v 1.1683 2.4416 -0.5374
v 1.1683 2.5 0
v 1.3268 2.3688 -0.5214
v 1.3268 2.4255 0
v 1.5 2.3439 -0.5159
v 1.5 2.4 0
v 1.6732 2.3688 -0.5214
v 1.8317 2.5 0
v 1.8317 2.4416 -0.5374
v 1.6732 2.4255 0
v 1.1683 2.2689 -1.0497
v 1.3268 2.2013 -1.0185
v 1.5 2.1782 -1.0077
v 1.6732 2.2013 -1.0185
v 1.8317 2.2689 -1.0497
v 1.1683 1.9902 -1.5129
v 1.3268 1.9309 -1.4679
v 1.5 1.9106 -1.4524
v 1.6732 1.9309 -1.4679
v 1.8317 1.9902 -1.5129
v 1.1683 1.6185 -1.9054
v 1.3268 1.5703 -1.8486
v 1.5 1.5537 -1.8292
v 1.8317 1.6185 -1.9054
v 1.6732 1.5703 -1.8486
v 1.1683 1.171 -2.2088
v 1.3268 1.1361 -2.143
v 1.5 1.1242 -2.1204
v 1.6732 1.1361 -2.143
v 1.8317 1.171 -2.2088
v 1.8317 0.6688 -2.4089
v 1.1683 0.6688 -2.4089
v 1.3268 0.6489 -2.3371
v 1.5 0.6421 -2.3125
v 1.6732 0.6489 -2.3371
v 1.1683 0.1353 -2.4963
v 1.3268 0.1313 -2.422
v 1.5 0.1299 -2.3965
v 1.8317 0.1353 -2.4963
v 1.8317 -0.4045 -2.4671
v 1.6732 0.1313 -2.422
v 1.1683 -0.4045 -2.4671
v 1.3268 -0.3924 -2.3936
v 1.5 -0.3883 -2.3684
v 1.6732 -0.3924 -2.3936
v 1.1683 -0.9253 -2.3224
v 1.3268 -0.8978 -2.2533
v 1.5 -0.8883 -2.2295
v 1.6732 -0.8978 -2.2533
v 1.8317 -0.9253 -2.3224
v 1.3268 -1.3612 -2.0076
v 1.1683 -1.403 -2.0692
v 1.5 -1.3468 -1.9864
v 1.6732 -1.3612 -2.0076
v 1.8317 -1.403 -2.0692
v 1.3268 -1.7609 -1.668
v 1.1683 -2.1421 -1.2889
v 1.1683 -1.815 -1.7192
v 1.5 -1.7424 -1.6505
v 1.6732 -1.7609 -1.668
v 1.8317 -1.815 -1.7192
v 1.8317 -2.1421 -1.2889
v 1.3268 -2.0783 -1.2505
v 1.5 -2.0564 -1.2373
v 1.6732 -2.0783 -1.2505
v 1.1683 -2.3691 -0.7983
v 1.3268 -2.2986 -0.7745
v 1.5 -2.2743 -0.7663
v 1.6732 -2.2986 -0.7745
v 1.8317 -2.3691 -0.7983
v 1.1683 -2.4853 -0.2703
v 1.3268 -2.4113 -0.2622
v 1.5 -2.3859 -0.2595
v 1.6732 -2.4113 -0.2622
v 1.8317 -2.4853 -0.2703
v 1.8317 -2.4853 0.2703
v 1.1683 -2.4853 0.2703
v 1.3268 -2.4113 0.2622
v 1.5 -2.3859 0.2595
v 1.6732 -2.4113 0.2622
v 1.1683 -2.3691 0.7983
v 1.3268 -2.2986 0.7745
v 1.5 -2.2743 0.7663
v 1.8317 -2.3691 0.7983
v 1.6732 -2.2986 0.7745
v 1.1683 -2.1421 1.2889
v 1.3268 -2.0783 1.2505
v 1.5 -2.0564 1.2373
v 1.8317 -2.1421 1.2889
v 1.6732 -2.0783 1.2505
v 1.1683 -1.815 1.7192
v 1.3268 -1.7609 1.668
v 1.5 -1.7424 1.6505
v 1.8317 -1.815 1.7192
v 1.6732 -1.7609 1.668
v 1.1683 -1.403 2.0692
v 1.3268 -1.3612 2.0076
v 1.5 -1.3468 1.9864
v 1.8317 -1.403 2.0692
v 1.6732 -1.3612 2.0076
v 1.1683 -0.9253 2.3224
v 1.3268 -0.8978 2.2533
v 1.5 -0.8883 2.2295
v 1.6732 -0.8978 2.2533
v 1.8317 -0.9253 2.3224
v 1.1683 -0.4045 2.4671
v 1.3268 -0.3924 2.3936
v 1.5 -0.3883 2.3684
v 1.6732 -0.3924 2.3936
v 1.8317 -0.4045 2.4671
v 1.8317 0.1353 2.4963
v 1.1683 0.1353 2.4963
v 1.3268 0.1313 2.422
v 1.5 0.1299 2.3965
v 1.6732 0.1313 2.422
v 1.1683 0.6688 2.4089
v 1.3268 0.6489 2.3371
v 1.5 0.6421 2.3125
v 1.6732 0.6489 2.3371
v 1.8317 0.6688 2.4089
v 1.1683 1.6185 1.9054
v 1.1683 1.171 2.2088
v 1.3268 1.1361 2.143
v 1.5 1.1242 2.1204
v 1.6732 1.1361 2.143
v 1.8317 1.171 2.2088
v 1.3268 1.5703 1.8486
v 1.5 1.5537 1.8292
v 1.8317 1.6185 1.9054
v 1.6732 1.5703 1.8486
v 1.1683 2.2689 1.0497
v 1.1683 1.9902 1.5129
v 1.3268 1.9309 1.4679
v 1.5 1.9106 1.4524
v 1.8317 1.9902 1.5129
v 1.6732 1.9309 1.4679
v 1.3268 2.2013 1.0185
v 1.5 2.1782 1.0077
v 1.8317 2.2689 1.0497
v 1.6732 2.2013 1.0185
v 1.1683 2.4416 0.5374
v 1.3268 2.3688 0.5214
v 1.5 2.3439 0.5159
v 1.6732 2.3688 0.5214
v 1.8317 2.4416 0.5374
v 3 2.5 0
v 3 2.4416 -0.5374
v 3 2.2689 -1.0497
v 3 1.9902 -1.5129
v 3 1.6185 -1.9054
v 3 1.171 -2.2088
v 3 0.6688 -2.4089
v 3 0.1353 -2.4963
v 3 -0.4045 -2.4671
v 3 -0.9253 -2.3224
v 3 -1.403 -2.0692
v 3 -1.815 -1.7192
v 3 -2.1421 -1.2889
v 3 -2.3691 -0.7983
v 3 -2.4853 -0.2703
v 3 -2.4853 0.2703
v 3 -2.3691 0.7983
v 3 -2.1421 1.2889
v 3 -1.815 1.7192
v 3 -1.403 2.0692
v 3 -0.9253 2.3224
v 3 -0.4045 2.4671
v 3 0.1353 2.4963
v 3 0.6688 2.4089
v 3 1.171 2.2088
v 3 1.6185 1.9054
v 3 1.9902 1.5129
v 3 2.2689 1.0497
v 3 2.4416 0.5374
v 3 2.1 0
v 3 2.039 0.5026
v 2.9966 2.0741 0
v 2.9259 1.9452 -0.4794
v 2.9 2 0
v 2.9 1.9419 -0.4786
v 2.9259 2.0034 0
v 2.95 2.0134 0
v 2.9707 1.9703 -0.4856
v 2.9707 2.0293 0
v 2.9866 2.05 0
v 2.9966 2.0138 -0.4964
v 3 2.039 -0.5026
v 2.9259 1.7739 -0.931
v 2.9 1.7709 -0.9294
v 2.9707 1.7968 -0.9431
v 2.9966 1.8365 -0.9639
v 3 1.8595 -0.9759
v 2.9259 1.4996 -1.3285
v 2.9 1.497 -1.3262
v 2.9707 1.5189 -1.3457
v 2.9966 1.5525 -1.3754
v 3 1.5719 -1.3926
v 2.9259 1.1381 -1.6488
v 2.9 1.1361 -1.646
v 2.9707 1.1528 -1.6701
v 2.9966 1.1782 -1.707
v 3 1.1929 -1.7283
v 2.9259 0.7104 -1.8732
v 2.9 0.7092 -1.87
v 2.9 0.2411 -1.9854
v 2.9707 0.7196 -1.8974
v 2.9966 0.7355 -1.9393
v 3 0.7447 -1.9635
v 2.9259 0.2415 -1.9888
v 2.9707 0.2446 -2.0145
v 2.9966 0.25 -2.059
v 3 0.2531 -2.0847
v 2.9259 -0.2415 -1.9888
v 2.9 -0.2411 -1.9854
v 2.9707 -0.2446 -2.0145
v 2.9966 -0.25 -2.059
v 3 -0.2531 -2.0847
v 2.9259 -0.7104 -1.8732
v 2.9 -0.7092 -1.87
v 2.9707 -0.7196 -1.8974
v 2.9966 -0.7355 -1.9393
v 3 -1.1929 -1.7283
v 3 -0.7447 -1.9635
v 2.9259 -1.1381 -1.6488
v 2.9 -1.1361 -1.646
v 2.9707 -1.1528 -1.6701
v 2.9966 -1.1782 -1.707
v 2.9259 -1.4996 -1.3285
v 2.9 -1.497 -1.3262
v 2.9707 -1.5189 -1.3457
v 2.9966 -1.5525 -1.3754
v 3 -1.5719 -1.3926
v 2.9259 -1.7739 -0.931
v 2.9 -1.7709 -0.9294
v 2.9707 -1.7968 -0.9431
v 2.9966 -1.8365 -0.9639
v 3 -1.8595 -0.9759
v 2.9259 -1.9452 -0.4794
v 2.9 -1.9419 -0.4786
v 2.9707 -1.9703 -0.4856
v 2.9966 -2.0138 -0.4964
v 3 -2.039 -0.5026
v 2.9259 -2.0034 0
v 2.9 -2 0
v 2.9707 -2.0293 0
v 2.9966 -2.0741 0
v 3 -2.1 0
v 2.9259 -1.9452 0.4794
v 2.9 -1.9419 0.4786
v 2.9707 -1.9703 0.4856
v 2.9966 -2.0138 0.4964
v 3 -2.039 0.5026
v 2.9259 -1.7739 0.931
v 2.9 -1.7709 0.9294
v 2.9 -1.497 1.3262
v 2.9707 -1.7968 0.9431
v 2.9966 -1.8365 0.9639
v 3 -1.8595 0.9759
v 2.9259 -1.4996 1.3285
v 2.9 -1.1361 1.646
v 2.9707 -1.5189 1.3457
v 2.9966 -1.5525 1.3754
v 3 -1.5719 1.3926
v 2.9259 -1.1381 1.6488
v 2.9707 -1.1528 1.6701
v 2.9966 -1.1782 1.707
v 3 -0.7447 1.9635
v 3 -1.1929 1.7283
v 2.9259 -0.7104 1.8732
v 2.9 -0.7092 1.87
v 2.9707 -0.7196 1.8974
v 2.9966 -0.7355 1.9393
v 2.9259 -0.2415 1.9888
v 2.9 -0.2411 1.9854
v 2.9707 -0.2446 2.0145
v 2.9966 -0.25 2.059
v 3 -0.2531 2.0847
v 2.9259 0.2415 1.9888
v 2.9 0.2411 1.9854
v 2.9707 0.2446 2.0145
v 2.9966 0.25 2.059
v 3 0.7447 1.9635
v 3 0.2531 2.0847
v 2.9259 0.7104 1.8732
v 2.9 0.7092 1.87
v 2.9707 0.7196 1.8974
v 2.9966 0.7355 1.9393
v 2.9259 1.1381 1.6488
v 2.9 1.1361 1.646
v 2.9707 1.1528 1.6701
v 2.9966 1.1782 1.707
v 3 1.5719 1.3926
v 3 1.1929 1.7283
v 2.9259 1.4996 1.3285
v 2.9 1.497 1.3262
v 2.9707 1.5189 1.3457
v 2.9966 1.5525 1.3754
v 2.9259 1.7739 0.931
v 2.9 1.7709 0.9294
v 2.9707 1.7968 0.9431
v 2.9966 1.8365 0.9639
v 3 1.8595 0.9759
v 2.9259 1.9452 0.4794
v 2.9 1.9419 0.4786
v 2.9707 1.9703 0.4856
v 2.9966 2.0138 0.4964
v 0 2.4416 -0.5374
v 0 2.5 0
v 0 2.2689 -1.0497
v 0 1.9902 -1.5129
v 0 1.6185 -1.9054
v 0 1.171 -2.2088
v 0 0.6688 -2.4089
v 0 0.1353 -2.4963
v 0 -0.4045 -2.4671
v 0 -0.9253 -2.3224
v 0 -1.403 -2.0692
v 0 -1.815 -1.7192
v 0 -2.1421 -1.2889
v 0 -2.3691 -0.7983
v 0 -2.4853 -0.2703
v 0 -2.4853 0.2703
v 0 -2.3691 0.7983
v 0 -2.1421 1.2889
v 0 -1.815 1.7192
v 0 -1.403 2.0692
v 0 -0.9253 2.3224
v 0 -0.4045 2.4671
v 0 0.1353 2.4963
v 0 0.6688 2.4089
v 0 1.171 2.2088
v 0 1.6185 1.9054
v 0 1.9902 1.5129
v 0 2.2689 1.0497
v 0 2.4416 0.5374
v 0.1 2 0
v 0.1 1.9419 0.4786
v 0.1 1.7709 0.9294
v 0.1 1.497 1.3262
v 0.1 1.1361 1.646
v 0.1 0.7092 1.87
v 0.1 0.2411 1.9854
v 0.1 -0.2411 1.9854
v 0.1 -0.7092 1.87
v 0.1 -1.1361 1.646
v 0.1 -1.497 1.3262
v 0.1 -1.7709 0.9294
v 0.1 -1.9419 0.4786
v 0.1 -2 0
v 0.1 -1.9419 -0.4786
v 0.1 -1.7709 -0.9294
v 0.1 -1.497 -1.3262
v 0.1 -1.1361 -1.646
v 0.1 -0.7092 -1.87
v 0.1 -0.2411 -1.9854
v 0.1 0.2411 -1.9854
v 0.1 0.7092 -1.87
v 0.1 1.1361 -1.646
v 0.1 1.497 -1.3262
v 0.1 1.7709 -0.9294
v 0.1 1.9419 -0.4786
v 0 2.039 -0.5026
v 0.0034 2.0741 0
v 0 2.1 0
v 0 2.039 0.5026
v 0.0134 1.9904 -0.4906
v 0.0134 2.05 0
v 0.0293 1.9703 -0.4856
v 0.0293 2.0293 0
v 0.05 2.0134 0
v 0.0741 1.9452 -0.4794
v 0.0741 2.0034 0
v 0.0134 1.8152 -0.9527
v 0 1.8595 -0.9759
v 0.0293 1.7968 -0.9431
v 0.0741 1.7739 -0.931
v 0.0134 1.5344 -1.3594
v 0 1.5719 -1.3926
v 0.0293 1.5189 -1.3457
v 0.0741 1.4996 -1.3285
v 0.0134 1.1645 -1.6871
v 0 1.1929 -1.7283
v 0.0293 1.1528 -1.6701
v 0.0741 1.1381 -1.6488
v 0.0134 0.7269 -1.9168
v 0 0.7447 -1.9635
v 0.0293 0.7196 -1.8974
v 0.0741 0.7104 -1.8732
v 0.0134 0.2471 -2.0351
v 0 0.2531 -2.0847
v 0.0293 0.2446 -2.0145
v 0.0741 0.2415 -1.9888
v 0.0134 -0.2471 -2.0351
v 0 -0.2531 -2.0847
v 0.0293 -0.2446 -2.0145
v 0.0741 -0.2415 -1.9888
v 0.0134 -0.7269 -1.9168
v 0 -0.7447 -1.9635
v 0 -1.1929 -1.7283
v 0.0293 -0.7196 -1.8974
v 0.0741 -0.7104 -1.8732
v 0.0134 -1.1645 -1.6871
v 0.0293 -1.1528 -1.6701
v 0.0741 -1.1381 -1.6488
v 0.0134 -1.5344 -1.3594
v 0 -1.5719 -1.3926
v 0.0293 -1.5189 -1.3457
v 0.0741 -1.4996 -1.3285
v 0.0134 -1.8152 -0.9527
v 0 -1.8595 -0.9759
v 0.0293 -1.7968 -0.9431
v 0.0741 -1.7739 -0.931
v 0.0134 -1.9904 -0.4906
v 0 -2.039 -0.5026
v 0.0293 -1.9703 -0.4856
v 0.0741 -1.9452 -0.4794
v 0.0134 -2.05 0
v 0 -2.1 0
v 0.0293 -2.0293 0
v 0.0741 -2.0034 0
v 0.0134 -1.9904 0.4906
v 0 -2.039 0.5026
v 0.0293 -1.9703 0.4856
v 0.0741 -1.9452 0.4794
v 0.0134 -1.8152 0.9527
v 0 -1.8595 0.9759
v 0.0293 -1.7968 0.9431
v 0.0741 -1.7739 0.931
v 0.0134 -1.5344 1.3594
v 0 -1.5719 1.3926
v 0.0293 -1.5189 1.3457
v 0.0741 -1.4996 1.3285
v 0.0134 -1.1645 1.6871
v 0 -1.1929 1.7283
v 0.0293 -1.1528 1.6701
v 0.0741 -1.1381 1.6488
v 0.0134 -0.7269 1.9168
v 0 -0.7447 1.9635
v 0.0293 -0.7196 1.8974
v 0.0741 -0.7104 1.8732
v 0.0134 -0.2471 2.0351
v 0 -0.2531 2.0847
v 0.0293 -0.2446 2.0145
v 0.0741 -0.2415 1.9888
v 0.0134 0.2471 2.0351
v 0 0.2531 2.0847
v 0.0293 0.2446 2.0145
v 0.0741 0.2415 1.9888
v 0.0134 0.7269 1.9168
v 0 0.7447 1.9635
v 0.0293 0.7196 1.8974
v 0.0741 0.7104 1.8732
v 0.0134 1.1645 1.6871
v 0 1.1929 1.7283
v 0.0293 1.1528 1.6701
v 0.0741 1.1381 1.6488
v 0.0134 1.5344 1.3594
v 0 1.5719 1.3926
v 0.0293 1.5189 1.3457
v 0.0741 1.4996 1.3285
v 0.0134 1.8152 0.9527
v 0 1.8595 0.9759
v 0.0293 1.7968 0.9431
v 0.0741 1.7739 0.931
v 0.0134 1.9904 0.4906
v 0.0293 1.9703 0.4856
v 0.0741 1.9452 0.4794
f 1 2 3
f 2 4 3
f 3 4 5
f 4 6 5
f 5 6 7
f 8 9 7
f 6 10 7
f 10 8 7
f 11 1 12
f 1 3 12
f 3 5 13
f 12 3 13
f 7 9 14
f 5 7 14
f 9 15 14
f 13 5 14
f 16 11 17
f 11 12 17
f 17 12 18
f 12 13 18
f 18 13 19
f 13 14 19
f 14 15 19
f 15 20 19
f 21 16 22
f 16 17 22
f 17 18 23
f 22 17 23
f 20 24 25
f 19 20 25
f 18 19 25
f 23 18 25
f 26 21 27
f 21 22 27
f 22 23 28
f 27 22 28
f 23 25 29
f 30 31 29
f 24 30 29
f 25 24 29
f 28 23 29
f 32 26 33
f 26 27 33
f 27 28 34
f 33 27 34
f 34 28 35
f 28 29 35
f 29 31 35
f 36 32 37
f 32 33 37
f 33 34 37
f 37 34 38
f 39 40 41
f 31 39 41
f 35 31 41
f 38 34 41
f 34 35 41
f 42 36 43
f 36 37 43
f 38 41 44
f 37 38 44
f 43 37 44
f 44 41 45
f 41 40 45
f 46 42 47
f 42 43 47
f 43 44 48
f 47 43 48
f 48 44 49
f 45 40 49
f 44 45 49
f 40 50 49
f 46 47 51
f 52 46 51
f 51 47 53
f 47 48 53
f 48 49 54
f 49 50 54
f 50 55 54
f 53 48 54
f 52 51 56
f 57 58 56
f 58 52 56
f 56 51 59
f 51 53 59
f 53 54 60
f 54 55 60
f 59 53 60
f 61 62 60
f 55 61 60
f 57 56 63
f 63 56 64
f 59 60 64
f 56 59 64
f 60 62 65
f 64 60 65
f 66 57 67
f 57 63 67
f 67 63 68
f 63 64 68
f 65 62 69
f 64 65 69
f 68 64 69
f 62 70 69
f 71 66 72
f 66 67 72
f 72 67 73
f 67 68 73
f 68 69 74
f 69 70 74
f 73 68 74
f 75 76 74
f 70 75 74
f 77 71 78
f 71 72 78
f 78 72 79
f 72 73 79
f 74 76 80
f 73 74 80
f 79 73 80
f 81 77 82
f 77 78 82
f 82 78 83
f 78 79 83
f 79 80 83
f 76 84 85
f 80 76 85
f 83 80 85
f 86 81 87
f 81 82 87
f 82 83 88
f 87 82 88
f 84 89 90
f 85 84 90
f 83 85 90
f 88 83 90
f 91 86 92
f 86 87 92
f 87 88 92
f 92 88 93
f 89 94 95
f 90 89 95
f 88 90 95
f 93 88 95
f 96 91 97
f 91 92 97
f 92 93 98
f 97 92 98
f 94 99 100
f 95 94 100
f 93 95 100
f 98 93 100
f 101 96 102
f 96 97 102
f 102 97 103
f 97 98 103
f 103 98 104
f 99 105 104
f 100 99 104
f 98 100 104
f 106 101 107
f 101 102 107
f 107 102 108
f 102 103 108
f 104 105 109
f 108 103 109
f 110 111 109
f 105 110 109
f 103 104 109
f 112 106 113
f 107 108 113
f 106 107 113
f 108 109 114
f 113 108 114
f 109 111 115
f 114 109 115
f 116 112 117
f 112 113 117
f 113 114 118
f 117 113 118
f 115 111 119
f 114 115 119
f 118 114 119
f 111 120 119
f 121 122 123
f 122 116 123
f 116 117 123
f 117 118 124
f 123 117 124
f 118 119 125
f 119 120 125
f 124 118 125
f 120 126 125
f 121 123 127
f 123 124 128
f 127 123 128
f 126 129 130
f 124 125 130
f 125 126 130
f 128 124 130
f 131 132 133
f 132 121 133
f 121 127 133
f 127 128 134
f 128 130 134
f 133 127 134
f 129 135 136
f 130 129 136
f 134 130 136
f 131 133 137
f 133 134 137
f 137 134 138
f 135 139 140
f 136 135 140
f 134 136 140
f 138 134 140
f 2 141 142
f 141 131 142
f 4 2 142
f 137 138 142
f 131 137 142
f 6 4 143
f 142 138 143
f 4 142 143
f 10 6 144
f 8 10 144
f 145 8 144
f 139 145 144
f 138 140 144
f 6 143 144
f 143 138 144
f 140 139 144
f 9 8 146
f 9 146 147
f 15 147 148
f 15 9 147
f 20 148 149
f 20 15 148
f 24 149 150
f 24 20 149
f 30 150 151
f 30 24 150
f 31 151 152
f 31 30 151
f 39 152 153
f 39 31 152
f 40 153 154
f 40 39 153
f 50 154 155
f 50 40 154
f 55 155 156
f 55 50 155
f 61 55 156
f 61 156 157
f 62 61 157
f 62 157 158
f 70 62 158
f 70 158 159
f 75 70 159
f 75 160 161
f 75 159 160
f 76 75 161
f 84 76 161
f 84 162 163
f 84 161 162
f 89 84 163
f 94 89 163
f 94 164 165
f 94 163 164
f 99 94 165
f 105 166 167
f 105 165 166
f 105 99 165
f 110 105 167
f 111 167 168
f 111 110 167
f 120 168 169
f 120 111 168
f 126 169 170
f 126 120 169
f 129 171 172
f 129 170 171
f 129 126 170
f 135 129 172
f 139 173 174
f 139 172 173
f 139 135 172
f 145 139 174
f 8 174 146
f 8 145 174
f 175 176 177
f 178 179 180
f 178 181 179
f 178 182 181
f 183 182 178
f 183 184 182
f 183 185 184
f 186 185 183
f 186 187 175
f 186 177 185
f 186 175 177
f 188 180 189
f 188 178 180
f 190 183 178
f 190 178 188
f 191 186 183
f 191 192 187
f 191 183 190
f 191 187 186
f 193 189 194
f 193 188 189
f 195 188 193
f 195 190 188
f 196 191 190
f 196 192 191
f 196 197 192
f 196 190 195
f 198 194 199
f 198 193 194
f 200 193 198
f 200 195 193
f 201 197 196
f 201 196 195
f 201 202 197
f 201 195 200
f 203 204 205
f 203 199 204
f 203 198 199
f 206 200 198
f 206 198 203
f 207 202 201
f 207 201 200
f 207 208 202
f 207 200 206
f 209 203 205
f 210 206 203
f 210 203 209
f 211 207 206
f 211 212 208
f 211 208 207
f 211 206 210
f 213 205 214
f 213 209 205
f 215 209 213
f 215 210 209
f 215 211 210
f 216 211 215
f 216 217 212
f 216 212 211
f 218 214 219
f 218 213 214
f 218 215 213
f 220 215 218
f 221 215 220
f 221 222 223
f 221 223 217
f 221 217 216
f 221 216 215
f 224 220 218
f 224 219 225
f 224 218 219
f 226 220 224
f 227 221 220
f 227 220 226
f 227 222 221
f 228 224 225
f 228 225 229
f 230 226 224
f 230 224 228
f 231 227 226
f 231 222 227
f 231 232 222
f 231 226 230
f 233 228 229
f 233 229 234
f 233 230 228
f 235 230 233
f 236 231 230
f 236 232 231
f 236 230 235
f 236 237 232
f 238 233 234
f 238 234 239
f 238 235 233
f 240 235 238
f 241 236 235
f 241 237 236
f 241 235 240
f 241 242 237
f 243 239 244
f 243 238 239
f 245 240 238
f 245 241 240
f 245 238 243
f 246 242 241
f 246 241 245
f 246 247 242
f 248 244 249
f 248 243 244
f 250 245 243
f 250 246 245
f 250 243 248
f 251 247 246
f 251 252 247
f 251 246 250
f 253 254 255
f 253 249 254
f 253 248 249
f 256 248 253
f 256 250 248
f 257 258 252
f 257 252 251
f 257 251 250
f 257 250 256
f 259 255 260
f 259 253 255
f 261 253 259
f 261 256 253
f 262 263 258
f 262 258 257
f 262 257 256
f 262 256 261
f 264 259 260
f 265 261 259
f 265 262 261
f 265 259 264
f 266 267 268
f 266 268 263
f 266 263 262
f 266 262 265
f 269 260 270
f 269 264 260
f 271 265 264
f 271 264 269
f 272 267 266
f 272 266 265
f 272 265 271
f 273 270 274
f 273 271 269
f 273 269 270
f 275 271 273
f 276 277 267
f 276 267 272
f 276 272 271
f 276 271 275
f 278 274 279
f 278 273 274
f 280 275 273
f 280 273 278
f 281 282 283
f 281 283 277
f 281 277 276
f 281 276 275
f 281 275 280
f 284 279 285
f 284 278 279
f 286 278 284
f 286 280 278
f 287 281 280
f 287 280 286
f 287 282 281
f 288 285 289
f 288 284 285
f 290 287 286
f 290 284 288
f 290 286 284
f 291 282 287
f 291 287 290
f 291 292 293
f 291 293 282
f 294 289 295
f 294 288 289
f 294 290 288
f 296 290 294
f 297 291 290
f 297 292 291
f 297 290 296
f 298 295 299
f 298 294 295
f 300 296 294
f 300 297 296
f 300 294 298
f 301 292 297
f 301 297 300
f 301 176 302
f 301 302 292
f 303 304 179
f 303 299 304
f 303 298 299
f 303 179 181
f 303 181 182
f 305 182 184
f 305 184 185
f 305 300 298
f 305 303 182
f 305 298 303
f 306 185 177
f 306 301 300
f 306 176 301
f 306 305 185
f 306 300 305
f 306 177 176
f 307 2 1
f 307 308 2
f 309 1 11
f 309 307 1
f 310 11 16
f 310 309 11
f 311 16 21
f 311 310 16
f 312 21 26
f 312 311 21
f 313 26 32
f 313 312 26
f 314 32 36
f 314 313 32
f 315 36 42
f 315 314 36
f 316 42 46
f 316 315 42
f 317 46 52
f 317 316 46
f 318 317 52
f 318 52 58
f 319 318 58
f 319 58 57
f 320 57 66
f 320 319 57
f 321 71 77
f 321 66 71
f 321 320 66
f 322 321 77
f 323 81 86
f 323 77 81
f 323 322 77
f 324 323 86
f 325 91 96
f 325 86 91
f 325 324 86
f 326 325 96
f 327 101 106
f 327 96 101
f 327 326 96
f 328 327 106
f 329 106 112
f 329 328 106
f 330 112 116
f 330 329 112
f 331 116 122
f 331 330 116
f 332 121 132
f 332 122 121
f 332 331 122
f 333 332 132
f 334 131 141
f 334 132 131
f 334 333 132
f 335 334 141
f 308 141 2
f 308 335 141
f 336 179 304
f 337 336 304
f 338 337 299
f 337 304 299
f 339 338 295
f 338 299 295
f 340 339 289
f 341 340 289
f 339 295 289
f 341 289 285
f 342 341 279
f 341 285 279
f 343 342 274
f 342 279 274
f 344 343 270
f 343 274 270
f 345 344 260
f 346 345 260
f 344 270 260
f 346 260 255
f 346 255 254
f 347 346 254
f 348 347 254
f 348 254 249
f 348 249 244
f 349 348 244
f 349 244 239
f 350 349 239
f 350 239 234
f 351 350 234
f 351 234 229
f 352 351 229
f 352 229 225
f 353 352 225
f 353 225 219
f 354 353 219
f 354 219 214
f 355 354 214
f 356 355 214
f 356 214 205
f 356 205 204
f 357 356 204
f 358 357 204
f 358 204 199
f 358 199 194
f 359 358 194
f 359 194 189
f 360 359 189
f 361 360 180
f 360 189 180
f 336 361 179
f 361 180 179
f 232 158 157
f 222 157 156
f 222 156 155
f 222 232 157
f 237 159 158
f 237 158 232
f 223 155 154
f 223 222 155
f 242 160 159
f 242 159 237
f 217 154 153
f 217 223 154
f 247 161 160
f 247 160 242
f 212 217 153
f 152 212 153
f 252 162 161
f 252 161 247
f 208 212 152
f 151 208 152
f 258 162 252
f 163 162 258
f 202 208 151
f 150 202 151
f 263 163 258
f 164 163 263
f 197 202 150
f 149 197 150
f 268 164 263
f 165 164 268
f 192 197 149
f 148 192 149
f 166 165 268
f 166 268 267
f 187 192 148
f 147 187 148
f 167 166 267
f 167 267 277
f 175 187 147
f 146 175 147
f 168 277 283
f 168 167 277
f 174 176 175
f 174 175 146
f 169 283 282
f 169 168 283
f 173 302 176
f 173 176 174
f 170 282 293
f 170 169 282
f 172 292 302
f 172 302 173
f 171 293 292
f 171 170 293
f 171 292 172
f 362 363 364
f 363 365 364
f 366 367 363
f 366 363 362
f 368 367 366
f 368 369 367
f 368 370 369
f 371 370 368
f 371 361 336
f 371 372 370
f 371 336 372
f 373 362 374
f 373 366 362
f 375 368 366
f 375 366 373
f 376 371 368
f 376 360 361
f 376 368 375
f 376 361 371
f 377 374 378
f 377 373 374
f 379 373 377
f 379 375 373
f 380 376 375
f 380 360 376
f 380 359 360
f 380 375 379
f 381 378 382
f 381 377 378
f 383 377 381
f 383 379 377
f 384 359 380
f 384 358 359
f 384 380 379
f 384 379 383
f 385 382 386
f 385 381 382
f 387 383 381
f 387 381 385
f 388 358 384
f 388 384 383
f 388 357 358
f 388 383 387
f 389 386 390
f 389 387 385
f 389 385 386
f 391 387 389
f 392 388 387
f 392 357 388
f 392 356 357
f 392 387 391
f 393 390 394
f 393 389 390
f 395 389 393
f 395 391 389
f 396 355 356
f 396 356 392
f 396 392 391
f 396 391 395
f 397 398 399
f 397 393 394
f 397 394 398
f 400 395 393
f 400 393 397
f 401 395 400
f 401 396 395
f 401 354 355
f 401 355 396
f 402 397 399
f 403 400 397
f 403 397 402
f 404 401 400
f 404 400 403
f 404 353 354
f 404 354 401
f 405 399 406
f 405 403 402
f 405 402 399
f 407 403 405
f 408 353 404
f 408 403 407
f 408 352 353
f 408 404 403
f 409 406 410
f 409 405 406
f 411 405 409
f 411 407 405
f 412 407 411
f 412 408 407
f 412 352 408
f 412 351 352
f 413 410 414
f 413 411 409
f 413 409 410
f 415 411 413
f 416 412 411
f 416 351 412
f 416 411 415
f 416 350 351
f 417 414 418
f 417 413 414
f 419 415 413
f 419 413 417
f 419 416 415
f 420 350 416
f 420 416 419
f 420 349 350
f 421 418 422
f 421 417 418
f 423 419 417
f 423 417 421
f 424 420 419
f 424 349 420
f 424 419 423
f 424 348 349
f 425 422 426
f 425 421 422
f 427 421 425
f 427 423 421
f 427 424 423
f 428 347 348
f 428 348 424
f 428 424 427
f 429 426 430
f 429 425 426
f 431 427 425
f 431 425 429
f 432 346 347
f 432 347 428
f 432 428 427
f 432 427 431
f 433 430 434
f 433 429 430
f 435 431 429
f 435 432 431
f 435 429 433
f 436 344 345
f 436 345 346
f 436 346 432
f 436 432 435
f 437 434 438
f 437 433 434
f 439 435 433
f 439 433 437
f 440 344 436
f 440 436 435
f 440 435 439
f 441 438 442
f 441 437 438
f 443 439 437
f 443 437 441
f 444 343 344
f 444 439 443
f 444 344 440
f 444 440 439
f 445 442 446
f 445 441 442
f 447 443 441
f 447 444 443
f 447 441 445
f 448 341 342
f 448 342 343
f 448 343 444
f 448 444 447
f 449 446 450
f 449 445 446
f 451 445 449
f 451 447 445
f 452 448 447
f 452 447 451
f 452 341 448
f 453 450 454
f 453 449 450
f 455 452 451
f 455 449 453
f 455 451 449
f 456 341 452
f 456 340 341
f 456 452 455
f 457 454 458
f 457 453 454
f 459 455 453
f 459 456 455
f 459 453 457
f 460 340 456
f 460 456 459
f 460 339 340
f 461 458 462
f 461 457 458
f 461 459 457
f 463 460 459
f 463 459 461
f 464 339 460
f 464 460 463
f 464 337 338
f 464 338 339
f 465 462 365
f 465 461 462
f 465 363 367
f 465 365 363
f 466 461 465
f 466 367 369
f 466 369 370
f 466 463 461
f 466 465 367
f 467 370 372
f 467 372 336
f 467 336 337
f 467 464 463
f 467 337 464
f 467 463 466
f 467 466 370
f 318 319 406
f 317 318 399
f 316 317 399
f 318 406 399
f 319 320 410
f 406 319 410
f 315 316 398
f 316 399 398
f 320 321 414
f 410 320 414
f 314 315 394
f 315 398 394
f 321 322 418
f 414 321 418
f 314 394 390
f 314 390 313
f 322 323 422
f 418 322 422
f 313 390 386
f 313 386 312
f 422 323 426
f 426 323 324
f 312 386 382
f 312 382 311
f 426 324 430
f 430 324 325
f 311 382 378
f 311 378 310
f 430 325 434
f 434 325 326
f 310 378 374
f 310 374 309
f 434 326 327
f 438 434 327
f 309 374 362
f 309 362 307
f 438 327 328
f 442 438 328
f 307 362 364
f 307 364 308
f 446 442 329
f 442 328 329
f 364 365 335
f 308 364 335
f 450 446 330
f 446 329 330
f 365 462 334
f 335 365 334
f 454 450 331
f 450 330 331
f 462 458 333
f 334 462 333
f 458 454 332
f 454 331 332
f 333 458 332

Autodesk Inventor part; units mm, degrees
sketch "Sketch_1" plane through (0, 0, 0) normal (0, 0, 1) x (1, 0, 0)
  line L0 (3, 0) -> (0, 0)
  arc A0 (0, 2.1) -> (0.1, 2) centre (0.1, 2.1) ccw
  line L1 (0.1, 2) -> (2.9, 2)
  arc A1 (2.9, 2) -> (3, 2.1) centre (2.9, 2.1) ccw
  line L2 (3, 2.1) -> (3, 2.5)
  line L3 (3, 2.5) -> (1.8317, 2.5)
  arc A2 (1.1683, 2.5) -> (1.8317, 2.5) centre (1.5, 3) ccw
  line L4 (1.1683, 2.5) -> (0, 2.5)
  line L5 (0, 2.5) -> (0, 2.1)
revolve "Revolution1" add sketch "Sketch_1" angle 360 about axis through (3, 0, 0) along (1, 0, 0)
ref_plane "ip_st_1_1_XY" through (1.5, 3, 0) normal (1, 0, 0) x (0, 0, -1)
ref_plane "ip_st_1_1_YZ" through (1.5, 3, 0) normal (0, 0, -1) x (0, 1, 0)
ref_plane "ip_st_1_1_ZX" through (1.5, 3, 0) normal (0, 1, 0) x (1, 0, 0)
ref_plane "ip_st_1_10_XY" through (1.5, 0, -3) normal (1, 0, 0) x (0, 0, -1)
ref_plane "ip_st_1_10_YZ" through (1.5, 0, -3) normal (0, 0, -1) x (0, 1, 0)
ref_plane "ip_st_1_10_ZX" through (1.5, 0, -3) normal (0, 1, 0) x (1, 0, 0)
ref_plane "ip_st_1_11_XY" through (1.5, 1.5, -2.5981) normal (1, 0, 0) x (0, 0, -1)
ref_plane "ip_st_1_11_YZ" through (1.5, 1.5, -2.5981) normal (0, 0, -1) x (0, 1, 0)
ref_plane "ip_st_1_11_ZX" through (1.5, 1.5, -2.5981) normal (0, 1, 0) x (1, 0, 0)
ref_plane "ip_st_1_12_XY" through (1.5, 2.5981, -1.5) normal (1, 0, 0) x (0, 0, -1)
ref_plane "ip_st_1_12_YZ" through (1.5, 2.5981, -1.5) normal (0, 0, -1) x (0, 1, 0)
ref_plane "ip_st_1_12_ZX" through (1.5, 2.5981, -1.5) normal (0, 1, 0) x (1, 0, 0)
ref_plane "ip_st_1_2_XY" through (1.5, 2.5981, 1.5) normal (1, 0, 0) x (0, 0, -1)
ref_plane "ip_st_1_2_YZ" through (1.5, 2.5981, 1.5) normal (0, 0, -1) x (0, 1, 0)
ref_plane "ip_st_1_2_ZX" through (1.5, 2.5981, 1.5) normal (0, 1, 0) x (1, 0, 0)
ref_plane "ip_st_1_3_XY" through (1.5, 1.5, 2.5981) normal (1, 0, 0) x (0, 0, -1)
ref_plane "ip_st_1_3_YZ" through (1.5, 1.5, 2.5981) normal (0, 0, -1) x (0, 1, 0)
ref_plane "ip_st_1_3_ZX" through (1.5, 1.5, 2.5981) normal (0, 1, 0) x (1, 0, 0)
ref_plane "ip_st_1_4_XY" through (1.5, 0, 3) normal (1, 0, 0) x (0, 0, -1)
ref_plane "ip_st_1_4_YZ" through (1.5, 0, 3) normal (0, 0, -1) x (0, 1, 0)
ref_plane "ip_st_1_4_ZX" through (1.5, 0, 3) normal (0, 1, 0) x (1, 0, 0)
ref_plane "ip_st_1_5_XY" through (1.5, -1.5, 2.5981) normal (1, 0, 0) x (0, 0, -1)
ref_plane "ip_st_1_5_YZ" through (1.5, -1.5, 2.5981) normal (0, 0, -1) x (0, 1, 0)
ref_plane "ip_st_1_5_ZX" through (1.5, -1.5, 2.5981) normal (0, 1, 0) x (1, 0, 0)
ref_plane "ip_st_1_6_XY" through (1.5, -2.5981, 1.5) normal (1, 0, 0) x (0, 0, -1)
ref_plane "ip_st_1_6_YZ" through (1.5, -2.5981, 1.5) normal (0, 0, -1) x (0, 1, 0)
ref_plane "ip_st_1_6_ZX" through (1.5, -2.5981, 1.5) normal (0, 1, 0) x (1, 0, 0)
ref_plane "ip_st_1_7_XY" through (1.5, -3, 0) normal (1, 0, 0) x (0, 0, -1)
ref_plane "ip_st_1_7_YZ" through (1.5, -3, 0) normal (0, 0, -1) x (0, 1, 0)
ref_plane "ip_st_1_7_ZX" through (1.5, -3, 0) normal (0, 1, 0) x (1, 0, 0)
ref_plane "ip_st_1_8_XY" through (1.5, -2.5981, -1.5) normal (1, 0, 0) x (0, 0, -1)
ref_plane "ip_st_1_8_YZ" through (1.5, -2.5981, -1.5) normal (0, 0, -1) x (0, 1, 0)
ref_plane "ip_st_1_8_ZX" through (1.5, -2.5981, -1.5) normal (0, 1, 0) x (1, 0, 0)
ref_plane "ip_st_1_9_XY" through (1.5, -1.5, -2.5981) normal (1, 0, 0) x (0, 0, -1)
ref_plane "ip_st_1_9_YZ" through (1.5, -1.5, -2.5981) normal (0, 0, -1) x (0, 1, 0)
ref_plane "ip_st_1_9_ZX" through (1.5, -1.5, -2.5981) normal (0, 1, 0) x (1, 0, 0)
ref_plane "ip_st_1a_XY" through (0, 0, 0) normal (1, 0, 0) x (0, 0, -1)
ref_plane "ip_st_1a_YZ" through (0, 0, 0) normal (0, 0, -1) x (0, 1, 0)
ref_plane "ip_st_1a_ZX" through (0, 0, 0) normal (0, 1, 0) x (1, 0, 0)
ref_plane "ip_st_2a_XY" through (0.1875, 0, 0) normal (1, 0, 0) x (0, 0, -1)
ref_plane "ip_st_2a_YZ" through (0.1875, 0, 0) normal (0, 0, -1) x (0, 1, 0)
ref_plane "ip_st_2a_ZX" through (0.1875, 0, 0) normal (0, 1, 0) x (1, 0, 0)
properties part number "MF84ZZ Inner Ring"
